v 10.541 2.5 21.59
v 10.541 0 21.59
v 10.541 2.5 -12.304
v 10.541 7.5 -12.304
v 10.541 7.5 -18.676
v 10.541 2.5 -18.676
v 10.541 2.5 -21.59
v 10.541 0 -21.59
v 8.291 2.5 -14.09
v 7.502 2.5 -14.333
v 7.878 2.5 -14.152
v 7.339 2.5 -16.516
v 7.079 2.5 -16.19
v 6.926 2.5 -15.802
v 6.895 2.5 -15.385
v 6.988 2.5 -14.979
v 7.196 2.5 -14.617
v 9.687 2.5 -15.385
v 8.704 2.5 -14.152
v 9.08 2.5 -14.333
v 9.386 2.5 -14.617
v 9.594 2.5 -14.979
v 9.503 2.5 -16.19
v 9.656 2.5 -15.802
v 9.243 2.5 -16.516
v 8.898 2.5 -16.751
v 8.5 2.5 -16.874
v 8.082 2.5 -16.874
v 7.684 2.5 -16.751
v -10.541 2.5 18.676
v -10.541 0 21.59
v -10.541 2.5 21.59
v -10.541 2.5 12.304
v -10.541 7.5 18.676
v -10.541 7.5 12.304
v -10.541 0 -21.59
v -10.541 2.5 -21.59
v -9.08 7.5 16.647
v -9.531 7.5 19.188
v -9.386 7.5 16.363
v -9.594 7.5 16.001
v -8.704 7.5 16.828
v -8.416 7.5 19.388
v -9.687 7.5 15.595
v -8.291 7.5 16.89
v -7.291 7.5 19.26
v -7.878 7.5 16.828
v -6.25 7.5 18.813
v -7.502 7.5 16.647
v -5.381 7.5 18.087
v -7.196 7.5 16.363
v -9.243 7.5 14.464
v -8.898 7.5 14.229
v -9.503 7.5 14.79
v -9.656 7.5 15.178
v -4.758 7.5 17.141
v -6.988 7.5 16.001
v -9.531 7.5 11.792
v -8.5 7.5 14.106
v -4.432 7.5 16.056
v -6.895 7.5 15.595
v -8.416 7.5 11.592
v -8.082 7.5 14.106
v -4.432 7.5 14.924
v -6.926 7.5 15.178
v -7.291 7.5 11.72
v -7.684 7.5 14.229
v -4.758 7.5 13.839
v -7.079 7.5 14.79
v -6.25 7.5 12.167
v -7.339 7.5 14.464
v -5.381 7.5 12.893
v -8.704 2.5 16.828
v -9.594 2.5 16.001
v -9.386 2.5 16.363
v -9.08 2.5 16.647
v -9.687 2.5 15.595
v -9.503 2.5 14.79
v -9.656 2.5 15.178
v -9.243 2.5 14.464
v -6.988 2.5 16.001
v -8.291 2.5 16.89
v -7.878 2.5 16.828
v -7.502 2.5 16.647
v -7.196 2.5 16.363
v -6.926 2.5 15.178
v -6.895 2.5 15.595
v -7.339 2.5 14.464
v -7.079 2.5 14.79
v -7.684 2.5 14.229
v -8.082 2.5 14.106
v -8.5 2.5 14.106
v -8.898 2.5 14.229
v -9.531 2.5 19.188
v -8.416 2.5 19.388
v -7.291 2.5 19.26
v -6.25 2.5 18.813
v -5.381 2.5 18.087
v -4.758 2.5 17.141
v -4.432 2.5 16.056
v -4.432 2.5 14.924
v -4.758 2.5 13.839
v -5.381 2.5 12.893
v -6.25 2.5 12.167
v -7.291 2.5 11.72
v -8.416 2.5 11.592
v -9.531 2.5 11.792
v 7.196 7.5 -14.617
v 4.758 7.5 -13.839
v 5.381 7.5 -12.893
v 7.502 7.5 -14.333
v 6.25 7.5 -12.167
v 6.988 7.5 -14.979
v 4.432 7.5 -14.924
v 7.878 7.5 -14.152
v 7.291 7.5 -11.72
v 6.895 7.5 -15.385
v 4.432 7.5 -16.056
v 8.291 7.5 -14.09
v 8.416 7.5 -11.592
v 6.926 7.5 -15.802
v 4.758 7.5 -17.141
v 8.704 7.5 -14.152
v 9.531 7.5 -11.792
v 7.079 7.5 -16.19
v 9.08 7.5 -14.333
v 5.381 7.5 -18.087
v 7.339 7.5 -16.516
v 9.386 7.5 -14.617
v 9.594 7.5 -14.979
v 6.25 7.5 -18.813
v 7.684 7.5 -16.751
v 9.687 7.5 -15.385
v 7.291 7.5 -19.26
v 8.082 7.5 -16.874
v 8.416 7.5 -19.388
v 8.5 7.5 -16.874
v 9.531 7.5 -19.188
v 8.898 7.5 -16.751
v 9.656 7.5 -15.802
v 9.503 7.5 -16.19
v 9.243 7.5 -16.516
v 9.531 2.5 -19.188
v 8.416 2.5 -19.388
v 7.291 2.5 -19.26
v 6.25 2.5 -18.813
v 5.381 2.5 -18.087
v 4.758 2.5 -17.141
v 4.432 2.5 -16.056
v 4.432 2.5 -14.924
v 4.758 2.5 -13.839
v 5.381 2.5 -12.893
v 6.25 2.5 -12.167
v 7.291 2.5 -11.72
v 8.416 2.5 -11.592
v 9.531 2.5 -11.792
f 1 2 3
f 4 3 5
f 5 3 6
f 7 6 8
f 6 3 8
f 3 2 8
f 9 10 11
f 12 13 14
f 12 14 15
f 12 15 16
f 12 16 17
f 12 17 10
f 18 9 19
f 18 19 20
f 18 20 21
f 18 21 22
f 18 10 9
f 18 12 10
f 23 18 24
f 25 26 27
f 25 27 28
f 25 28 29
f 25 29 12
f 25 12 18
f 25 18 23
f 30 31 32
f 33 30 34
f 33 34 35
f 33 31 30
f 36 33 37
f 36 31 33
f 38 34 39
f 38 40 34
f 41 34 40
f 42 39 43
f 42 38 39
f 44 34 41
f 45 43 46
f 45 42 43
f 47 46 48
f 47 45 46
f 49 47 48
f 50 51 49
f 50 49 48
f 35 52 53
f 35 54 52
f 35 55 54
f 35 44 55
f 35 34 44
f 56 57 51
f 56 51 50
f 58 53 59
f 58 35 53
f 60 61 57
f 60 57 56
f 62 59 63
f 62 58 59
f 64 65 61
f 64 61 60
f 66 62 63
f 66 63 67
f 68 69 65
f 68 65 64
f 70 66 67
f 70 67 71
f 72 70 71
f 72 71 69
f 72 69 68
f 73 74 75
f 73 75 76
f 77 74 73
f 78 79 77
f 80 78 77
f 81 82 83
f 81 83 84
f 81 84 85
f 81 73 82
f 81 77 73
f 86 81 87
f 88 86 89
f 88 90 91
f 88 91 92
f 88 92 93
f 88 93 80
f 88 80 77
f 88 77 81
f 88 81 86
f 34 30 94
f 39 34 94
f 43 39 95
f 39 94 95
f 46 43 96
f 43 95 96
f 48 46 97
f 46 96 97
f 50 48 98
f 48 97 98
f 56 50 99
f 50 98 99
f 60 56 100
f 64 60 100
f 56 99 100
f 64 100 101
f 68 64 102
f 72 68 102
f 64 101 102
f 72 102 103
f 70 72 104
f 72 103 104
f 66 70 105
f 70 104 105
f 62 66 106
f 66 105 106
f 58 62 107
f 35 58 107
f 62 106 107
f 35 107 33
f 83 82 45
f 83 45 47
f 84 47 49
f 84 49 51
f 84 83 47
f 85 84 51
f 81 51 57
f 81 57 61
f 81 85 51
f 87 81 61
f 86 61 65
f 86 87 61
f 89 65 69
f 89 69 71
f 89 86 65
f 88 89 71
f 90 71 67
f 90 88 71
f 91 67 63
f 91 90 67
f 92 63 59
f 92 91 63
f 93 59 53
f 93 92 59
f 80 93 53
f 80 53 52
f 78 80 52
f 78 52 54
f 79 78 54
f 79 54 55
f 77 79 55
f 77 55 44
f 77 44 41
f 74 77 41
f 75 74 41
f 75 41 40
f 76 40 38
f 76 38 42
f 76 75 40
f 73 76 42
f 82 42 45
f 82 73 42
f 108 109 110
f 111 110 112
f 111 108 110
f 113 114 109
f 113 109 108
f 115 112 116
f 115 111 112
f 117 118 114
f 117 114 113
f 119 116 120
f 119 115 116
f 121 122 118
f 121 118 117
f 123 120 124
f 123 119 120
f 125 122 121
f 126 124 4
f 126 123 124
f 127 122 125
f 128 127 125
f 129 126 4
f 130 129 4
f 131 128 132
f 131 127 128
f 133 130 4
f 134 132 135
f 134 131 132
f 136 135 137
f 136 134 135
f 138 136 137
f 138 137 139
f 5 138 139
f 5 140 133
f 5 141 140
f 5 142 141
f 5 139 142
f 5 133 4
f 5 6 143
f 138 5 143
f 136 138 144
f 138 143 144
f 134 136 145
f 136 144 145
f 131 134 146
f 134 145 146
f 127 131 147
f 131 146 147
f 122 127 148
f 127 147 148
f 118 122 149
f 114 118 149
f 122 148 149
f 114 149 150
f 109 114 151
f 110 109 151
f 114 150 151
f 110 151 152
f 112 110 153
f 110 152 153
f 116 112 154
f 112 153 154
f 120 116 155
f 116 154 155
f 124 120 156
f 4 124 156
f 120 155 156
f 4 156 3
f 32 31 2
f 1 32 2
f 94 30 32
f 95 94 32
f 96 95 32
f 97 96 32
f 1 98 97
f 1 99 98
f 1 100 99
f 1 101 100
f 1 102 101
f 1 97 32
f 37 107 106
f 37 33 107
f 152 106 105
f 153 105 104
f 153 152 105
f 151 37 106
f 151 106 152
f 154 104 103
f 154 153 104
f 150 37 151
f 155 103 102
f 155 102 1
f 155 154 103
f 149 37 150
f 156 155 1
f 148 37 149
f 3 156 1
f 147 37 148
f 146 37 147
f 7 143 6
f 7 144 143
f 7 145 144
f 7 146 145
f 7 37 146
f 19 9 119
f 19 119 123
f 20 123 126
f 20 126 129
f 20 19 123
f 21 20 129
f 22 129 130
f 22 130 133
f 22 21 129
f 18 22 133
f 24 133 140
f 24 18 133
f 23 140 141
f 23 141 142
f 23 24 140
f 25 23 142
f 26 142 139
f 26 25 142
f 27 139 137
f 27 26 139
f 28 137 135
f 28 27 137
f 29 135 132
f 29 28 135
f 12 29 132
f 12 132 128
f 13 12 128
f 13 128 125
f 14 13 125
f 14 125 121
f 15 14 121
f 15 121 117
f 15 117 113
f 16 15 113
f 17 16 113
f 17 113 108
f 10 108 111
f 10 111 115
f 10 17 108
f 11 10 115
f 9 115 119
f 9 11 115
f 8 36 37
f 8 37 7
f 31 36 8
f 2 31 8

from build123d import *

# Parameters (mm, degrees)
SKETCH1_W           = 21.082
SKETCH1_H           = 43.18
BOSS_EXTRUDE1_DEPTH = 2.5
SKETCH2_R           = 1.4
BOSS_EXTRUDE2_DEPTH = 5


with BuildPart() as part:
    # Sketch1 → Boss-Extrude1 (new body)
    with BuildSketch(Plane(origin=(0, 0, 0), x_dir=(1, 0, 0), z_dir=(0, 1, 0))):
        Rectangle(SKETCH1_W, SKETCH1_H)
    extrude(amount=BOSS_EXTRUDE1_DEPTH)

    # Sketch2 → Boss-Extrude2 (add)
    # profile 1 of 2: a face of its own
    with BuildSketch(Plane(origin=(0, 2.5, 0), x_dir=(1, 0, 0), z_dir=(0, 1, 0))):
        with BuildLine():
            Line((10.541, 12.304485913), (10.541, 18.675514087))
            ThreePointArc((10.541, 18.675514087), (4.391, 15.49), (10.541, 12.304485913))
        make_face()
        with Locations(Location((8.291, 15.49, 0), (0, 0, 270))):
            Circle(SKETCH2_R, mode=Mode.SUBTRACT)
    # profile 2 of 2: a face of its own
    with BuildSketch(Plane(origin=(0, 2.5, 0), x_dir=(1, 0, 0), z_dir=(0, 1, 0))):
        with BuildLine():
            ThreePointArc((-10.541, -18.675514087), (-4.391, -15.49), (-10.541, -12.304485913))
            Line((-10.541, -12.304485913), (-10.541, -18.675514087))
        make_face()
        with Locations(Location((-8.291, -15.49, 0), (0, 0, 270))):
            Circle(SKETCH2_R, mode=Mode.SUBTRACT)
    extrude(amount=BOSS_EXTRUDE2_DEPTH)


solid = part.part
